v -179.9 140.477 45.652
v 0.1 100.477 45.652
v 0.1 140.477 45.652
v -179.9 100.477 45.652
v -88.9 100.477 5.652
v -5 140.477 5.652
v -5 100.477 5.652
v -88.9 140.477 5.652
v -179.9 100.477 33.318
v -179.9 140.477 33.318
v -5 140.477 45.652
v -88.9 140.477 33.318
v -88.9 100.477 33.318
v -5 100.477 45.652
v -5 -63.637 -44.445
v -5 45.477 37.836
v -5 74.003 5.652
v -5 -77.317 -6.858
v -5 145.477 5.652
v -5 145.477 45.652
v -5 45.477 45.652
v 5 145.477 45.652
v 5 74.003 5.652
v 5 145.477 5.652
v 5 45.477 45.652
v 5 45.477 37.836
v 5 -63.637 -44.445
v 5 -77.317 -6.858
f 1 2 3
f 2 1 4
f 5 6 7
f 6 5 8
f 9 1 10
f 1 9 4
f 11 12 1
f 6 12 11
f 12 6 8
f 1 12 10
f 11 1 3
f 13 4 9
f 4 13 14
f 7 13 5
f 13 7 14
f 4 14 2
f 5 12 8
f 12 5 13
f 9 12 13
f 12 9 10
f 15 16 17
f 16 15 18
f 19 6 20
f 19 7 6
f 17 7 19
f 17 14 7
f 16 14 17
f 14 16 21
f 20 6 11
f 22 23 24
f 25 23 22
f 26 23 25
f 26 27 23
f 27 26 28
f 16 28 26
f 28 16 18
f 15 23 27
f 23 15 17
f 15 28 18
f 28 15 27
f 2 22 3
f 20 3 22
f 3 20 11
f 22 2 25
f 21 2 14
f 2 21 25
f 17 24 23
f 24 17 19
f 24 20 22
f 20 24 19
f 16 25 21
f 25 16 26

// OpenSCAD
arm_x = 10;
arm_y = 150;
arm_z = 40;
arm_angle = 20;
rotate([arm_angle,0,0])
cube([arm_x, arm_y, arm_z],center=true);


short_arm_x = 10;
short_arm_y = 100;
short_arm_z = 40;

x_base = 180;
y_base = 40;
z_base = 40;

translate([0,cos(arm_angle)*arm_y/2+short_arm_y/4,sin(arm_angle)*arm_y/2])
    cube([short_arm_x, short_arm_y, short_arm_z],center=true);

translate([-x_base/2+0.1,cos(arm_angle)*arm_y/2+short_arm_y/2,sin(arm_angle)*arm_y/2])
    difference(){
        cube([x_base,y_base,z_base],center=true);
        translate([-x_base/2,0,-z_base/3])
            cube([x_base+2,y_base+2,z_base+2],center=true);
    }   

ant_z = 350;
ant_y = 240;
ant_x = 10;

//color("blue") {
//translate([-x_base+0.1,cos(arm_angle)*arm_y/2+short_arm_y/2,sin(arm_angle)*arm_y/2-ant_z/2+10])
//cube([ant_x,ant_y,ant_z],center = true);
// 
//install_position_y = -180;
//   
//box_y = 210;
//box_x = 230;
//box_z = 230;
//translate([box_x/2,install_position_y,-box_z/2])   
//cube([box_x,box_y,box_z],center = true);
//
//robot_z = 380-210;
//robot_x = 400;
//robot_y = 410;
//
//translate([box_x/2,install_position_y,-box_z-robot_z/2])   
//cube([robot_x,robot_y,robot_z],center = true);
//}
